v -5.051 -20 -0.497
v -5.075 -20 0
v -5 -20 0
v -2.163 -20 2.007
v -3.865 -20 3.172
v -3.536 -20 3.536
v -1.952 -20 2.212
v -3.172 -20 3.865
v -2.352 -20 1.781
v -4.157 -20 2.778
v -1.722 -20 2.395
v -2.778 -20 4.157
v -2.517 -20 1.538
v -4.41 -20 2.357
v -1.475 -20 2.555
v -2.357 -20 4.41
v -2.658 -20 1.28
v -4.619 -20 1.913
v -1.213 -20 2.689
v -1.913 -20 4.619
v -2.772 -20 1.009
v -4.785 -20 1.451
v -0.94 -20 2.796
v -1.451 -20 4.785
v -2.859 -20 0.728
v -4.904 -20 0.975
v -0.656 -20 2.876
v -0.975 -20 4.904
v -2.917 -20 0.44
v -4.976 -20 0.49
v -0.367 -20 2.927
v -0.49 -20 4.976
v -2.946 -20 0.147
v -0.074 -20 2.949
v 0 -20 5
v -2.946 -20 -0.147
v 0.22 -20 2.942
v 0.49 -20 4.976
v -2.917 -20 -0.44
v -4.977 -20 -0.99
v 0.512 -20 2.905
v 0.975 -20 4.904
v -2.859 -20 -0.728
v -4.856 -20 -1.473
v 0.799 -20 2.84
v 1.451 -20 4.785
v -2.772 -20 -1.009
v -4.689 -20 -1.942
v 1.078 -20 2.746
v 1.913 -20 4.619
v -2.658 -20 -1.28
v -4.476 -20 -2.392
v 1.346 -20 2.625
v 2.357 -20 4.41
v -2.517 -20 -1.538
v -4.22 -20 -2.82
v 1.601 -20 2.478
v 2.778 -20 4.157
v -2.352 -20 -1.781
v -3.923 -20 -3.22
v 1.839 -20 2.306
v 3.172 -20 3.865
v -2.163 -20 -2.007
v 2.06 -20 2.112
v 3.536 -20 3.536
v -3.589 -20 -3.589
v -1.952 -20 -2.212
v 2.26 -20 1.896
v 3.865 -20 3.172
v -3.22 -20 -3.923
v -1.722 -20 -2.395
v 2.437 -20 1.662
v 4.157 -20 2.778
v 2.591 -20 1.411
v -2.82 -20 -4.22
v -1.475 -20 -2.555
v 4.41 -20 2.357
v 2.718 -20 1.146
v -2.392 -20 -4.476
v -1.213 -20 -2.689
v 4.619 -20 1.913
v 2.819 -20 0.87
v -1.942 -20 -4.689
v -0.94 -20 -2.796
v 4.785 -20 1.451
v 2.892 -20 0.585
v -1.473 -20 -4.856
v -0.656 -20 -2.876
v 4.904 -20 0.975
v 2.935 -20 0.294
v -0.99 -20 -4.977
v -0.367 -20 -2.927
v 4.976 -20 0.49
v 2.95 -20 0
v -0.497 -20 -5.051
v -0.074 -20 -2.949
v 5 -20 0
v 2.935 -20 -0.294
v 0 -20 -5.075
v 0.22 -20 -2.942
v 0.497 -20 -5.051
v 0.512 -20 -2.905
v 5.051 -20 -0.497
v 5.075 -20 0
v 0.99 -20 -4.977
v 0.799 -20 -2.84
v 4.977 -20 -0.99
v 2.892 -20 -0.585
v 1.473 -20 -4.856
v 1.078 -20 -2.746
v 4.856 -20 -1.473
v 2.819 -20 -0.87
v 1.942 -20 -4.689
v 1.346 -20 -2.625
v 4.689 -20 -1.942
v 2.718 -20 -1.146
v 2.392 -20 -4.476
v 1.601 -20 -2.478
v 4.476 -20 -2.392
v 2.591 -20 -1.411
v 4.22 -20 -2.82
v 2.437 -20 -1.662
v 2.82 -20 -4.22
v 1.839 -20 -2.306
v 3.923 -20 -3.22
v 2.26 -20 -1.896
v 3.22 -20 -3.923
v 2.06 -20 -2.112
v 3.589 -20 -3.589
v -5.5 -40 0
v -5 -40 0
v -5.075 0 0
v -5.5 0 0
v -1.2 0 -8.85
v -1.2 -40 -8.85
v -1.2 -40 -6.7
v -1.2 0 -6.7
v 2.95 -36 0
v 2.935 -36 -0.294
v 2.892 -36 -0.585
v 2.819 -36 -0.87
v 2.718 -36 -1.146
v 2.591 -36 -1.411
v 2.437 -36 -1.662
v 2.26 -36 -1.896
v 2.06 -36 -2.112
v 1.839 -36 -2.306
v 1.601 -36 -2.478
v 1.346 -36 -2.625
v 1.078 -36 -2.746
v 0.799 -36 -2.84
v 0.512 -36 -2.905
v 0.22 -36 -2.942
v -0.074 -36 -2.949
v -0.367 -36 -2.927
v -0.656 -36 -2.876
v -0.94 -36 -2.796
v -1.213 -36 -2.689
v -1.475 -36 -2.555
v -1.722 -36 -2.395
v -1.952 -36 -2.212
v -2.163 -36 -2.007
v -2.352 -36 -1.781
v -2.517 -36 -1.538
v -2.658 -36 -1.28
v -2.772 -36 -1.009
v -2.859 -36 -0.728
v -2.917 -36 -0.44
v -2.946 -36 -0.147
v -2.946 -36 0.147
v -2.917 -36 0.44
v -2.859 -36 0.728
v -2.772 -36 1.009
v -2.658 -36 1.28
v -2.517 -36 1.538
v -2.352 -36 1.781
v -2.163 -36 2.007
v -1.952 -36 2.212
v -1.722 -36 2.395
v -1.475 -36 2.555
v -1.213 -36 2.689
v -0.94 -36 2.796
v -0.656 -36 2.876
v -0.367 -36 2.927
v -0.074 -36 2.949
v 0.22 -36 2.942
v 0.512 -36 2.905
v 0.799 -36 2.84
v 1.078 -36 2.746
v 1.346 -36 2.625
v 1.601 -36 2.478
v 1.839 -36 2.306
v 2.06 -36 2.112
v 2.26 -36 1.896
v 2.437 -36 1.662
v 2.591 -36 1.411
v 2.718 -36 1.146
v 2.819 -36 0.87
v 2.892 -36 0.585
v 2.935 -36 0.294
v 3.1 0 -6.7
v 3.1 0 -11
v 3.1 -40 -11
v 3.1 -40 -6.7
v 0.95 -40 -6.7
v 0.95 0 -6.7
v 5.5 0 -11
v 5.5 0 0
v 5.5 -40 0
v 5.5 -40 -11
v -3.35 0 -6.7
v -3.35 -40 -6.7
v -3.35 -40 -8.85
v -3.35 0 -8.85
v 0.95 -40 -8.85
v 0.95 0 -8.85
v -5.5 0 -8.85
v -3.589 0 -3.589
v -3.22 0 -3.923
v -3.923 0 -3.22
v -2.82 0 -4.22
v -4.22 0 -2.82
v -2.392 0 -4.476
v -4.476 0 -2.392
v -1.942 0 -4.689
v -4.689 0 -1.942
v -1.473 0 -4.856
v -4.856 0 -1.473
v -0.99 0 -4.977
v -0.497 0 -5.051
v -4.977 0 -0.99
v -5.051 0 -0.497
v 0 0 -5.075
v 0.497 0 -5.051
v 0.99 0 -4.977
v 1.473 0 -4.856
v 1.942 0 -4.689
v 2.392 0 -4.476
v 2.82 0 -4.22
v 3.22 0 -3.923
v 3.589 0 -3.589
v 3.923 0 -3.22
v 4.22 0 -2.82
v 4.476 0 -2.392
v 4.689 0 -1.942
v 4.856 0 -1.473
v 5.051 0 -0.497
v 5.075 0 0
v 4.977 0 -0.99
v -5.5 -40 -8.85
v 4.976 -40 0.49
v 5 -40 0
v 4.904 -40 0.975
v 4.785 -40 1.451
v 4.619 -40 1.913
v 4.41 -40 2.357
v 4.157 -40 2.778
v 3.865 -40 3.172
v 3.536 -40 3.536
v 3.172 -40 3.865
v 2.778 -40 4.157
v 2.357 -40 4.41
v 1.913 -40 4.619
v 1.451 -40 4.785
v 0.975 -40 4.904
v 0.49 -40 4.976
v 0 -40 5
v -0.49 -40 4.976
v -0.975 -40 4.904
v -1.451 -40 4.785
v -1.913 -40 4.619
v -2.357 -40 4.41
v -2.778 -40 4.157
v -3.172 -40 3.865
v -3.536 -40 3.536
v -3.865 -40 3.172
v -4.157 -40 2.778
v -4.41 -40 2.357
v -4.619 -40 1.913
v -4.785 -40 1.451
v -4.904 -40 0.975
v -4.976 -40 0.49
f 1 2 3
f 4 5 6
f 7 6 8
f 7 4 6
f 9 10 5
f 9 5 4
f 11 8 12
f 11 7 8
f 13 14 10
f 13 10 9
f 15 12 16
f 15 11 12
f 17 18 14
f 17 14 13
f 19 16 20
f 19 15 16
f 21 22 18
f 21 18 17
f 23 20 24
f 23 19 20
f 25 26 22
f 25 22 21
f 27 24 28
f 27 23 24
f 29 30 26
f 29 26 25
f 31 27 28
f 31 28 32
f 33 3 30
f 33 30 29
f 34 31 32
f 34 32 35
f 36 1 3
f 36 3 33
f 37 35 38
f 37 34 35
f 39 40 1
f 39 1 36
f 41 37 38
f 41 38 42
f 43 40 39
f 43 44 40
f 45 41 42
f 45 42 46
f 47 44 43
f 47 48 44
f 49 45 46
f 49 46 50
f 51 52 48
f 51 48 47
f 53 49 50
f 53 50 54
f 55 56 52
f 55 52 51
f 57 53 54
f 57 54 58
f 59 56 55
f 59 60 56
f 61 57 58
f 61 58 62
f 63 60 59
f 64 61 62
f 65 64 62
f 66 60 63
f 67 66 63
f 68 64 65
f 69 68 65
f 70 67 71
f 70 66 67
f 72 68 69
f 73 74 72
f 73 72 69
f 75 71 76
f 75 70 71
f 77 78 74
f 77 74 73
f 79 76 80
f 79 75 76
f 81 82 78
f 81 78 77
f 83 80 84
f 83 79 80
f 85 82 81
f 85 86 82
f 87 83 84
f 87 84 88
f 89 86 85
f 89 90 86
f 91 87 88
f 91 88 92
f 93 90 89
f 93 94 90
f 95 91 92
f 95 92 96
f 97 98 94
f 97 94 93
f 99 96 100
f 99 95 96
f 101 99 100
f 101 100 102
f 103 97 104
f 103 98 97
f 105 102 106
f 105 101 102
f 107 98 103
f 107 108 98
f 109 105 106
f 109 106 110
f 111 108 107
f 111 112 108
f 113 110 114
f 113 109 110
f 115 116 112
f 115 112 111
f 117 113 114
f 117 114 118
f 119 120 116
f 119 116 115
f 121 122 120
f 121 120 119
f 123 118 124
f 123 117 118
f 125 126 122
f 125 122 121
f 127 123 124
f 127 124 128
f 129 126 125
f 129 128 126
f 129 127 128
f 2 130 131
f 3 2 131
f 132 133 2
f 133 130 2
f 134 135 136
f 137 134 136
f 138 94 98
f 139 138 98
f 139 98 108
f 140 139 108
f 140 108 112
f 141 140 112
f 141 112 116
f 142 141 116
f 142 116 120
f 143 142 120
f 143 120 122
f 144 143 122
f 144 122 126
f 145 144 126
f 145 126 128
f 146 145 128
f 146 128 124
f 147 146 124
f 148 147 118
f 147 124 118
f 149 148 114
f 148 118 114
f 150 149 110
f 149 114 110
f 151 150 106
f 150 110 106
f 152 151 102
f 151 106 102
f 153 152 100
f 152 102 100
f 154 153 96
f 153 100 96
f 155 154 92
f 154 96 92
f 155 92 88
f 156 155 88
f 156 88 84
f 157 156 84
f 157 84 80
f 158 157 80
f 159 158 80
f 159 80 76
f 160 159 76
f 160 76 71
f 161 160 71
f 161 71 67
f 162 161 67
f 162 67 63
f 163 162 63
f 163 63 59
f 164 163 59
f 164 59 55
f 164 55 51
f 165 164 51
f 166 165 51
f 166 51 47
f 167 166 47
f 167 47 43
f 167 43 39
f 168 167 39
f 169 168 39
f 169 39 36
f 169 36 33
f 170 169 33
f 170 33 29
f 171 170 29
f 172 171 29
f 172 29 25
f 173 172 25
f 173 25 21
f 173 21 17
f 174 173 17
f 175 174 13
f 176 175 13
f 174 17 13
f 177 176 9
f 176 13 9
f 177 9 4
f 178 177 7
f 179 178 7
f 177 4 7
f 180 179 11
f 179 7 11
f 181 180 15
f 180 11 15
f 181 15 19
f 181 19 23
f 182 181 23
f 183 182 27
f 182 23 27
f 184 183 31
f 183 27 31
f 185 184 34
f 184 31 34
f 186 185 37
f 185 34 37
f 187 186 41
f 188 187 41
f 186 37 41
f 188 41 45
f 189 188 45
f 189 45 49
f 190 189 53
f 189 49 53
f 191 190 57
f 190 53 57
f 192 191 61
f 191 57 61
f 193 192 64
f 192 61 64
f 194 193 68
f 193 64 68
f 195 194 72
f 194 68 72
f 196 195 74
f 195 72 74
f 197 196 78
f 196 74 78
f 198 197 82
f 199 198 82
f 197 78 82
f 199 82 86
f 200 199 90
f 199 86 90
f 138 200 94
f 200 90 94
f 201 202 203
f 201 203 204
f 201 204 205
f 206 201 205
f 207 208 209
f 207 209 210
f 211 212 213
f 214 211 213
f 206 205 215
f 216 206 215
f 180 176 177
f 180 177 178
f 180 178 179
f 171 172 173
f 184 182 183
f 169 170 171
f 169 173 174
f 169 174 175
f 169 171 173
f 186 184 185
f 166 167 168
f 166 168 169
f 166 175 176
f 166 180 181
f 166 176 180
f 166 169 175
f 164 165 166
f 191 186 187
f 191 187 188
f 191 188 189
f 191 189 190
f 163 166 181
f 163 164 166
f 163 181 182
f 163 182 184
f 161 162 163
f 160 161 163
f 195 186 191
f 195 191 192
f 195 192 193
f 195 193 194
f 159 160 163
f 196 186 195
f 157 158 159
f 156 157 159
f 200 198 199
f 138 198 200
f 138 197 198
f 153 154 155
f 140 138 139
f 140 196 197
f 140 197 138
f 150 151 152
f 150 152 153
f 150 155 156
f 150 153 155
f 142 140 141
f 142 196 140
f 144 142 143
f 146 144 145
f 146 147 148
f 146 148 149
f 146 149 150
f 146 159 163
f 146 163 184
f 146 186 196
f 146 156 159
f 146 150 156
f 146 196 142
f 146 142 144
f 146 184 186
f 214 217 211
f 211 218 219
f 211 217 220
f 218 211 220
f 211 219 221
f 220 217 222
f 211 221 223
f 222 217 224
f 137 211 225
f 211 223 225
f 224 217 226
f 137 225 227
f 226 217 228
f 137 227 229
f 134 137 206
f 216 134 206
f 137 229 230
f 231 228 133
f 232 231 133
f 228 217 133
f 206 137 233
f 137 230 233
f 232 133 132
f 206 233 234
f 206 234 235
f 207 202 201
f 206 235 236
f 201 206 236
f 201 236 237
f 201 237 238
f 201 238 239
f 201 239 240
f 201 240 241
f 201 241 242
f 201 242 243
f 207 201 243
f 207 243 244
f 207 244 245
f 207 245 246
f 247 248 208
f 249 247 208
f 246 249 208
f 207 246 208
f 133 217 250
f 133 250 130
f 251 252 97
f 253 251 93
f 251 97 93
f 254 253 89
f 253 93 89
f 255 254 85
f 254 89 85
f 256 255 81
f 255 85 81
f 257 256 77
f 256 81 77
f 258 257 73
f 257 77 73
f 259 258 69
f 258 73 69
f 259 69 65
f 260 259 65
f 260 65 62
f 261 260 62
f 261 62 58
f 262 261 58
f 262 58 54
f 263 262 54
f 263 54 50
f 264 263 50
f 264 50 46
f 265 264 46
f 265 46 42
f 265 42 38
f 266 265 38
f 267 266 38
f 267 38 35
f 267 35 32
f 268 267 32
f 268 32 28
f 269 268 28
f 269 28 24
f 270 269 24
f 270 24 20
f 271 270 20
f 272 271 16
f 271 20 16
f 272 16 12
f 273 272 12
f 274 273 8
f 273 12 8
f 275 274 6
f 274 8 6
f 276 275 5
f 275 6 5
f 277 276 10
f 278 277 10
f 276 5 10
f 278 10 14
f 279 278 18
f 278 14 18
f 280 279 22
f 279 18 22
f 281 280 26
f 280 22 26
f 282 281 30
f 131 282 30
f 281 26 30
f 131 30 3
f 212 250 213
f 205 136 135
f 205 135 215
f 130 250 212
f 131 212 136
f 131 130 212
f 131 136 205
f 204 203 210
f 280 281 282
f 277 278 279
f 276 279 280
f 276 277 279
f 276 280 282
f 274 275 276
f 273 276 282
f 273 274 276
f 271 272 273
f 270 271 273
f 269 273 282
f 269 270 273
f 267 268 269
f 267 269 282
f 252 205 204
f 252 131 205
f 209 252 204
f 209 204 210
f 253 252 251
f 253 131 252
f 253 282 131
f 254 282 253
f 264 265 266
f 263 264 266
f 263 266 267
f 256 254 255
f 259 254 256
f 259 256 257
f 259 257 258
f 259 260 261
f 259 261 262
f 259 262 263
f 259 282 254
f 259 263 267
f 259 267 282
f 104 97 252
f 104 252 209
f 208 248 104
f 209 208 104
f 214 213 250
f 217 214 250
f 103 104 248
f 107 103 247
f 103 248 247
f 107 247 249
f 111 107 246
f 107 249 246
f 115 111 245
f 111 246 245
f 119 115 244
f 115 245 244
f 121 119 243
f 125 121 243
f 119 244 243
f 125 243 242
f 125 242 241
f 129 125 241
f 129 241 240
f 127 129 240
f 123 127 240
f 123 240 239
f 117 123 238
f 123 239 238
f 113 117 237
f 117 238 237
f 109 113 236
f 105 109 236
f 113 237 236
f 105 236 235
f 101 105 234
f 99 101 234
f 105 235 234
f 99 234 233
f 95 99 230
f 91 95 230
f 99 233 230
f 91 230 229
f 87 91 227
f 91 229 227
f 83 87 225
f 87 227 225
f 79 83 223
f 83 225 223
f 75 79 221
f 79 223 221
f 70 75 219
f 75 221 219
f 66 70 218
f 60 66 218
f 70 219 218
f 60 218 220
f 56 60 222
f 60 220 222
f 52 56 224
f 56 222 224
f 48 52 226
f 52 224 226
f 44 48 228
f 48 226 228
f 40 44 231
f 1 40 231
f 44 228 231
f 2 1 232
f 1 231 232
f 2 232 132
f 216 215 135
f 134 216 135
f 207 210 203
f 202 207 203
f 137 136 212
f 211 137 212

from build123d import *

# Parameters (mm, degrees)
PAD_DEPTH       = 40
SKETCH001_R     = 5
POCKET_DEPTH    = 20
SKETCH002_R     = 2.95
POCKET001_DEPTH = 16
POCKET002_DEPTH = 40.001
POCKET003_DEPTH = 20


with BuildPart() as part:
    # Sketch → Pad (new body)
    with BuildSketch(Plane.XZ):
        with BuildLine():
            ThreePointArc((5, 0), (0, 5), (-5, 0))
            Line((-5.5, 0), (-5, 0))
            Line((-5.5, -11), (-5.5, 0))
            Line((5.5, -11), (-5.5, -11))
            Line((5.5, 0), (5.5, -11))
            Line((5, 0), (5.5, 0))
        make_face()
    extrude(amount=PAD_DEPTH)

    # Sketch001 (on Face7 of Pad) → Pocket (cut)
    with BuildSketch(Plane(origin=(0, 0, 0), x_dir=(1, 0, 0), z_dir=(0, 1, 0))):
        Circle(SKETCH001_R)
    extrude(amount=-POCKET_DEPTH, mode=Mode.SUBTRACT)

    # Sketch002 (on Face8 of Pocket) → Pocket001 (cut)
    with BuildSketch(Plane(origin=(0, -20, 0), x_dir=(1, 0, 0), z_dir=(0, 1, 0))):
        Circle(SKETCH002_R)
    extrude(amount=-POCKET001_DEPTH, mode=Mode.SUBTRACT)

    # Sketch003 (on Face5 of Pocket001) → Pocket002 (cut, through all)
    with BuildSketch(Plane(origin=(0, 0, 0), x_dir=(1, 0, 0), z_dir=(0, 1, 0))):
        Polygon((-5.5, 11), (3.1, 11), (3.1, 6.7), (0.95, 6.7), (0.95, 8.85), (-1.2, 8.85), (-1.2, 6.7), (-3.35, 6.7), (-3.35, 8.85), (-5.5, 8.85), align=None)
    extrude(amount=-POCKET002_DEPTH, mode=Mode.SUBTRACT)

    # Sketch004 (on Face5 of Pocket002) → Pocket003 (cut)
    with BuildSketch(Plane(origin=(0, 0, 0), x_dir=(1, 0, 0), z_dir=(0, 1, 0))):
        with BuildLine():
            ThreePointArc((5.075, 0), (0, 5.075), (-5.075, 0))
            Line((-5.075, 0), (5.075, 0))
        make_face()
    extrude(amount=-POCKET003_DEPTH, mode=Mode.SUBTRACT)


solid = part.part
